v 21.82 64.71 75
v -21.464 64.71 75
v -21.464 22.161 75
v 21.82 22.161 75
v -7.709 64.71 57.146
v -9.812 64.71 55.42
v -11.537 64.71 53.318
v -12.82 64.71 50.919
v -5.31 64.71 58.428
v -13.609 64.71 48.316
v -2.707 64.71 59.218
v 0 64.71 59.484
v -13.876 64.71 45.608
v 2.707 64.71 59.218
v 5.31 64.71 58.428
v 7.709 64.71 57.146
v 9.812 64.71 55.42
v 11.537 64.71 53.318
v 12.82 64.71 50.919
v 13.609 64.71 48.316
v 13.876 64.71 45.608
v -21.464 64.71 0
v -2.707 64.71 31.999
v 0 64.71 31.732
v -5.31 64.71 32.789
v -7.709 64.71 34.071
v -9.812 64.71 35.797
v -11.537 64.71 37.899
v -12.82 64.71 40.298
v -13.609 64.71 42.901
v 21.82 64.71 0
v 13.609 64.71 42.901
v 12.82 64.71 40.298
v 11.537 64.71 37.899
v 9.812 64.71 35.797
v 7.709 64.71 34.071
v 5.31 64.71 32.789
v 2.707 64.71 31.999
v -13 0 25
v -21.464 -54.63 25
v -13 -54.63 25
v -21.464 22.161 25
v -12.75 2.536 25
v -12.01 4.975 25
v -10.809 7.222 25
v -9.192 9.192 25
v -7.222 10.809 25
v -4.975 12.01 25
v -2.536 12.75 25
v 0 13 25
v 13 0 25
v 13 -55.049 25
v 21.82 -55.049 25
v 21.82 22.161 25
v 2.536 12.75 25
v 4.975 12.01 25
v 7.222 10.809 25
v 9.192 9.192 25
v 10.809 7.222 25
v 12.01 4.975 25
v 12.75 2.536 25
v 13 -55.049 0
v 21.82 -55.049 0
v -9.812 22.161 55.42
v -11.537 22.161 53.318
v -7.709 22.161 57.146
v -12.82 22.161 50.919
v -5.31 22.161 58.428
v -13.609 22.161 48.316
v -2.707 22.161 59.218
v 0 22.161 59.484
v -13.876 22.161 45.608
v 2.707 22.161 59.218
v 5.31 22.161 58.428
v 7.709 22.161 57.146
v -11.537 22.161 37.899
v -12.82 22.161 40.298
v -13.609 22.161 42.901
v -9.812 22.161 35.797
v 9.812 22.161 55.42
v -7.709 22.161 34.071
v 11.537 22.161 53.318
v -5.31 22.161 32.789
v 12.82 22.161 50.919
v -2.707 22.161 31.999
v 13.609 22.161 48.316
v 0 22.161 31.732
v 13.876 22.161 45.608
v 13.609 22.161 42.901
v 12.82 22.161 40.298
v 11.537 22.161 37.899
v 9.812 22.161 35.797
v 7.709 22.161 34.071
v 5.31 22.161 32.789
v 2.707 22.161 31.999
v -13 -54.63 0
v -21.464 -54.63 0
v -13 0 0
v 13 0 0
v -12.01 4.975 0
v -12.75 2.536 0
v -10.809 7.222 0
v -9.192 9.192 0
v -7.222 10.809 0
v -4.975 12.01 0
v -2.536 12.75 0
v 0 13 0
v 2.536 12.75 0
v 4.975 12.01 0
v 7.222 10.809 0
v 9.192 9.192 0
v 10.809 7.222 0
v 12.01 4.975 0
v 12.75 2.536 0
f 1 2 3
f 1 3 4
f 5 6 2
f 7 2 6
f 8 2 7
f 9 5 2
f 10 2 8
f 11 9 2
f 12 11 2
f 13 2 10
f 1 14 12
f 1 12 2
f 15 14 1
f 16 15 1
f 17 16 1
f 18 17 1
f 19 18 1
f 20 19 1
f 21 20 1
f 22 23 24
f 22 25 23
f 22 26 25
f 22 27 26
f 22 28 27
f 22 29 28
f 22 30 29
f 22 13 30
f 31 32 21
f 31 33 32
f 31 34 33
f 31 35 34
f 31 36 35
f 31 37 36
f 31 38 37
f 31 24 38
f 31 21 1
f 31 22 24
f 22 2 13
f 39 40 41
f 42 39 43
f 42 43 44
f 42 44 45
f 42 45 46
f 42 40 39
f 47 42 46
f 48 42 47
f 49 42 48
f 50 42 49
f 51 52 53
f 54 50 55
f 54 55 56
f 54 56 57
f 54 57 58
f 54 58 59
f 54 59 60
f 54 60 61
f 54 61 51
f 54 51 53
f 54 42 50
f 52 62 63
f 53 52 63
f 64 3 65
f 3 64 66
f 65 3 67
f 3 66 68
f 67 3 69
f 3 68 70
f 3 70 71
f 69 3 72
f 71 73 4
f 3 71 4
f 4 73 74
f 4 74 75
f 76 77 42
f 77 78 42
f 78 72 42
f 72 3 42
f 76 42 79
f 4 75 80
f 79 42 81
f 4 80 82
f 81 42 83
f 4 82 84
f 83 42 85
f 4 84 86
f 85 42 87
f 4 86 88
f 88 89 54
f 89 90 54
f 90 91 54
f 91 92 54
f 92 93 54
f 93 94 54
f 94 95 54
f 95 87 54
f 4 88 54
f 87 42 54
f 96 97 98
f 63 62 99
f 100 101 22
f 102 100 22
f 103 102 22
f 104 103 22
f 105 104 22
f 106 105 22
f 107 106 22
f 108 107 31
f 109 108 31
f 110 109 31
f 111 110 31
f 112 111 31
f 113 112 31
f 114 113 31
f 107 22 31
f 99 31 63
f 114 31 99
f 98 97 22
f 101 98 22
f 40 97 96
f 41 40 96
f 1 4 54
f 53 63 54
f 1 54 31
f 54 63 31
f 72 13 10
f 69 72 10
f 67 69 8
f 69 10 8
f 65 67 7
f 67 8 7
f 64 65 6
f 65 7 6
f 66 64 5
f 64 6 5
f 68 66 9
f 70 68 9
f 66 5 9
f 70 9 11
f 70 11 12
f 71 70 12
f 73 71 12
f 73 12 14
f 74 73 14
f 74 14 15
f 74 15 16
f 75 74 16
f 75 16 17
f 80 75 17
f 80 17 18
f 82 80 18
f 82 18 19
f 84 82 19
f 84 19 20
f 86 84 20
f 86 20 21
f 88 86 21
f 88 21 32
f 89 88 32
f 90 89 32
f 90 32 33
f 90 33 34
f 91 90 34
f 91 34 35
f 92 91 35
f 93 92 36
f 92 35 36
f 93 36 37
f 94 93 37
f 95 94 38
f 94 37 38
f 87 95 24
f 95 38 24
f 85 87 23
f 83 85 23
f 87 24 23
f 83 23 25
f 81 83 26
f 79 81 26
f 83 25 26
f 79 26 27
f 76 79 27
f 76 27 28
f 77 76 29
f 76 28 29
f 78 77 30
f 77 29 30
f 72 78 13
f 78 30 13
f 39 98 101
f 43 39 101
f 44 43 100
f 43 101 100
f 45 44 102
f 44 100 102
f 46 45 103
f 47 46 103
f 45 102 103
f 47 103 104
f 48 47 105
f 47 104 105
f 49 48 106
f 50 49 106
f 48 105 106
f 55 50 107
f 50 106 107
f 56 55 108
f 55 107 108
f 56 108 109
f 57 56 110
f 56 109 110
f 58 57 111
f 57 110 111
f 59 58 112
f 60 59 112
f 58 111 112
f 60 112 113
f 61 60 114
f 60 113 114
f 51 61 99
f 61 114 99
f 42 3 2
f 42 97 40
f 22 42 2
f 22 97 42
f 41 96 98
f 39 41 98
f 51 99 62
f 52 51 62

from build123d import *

# Parameters (mm, degrees)
F1_DEPTH = 25
F2_W     = 43.2835130529
F2_H     = 42.5491245473
F3_DEPTH = 50
F4_R     = 13.8760258661
F5_DEPTH = 119.7601809589


with BuildPart() as f1:
    # F0 (on Top) → F1 (new body)
    with BuildSketch(Plane.XY):
        with BuildLine():
            ThreePointArc((21.4635129483, 0), (19.2315893312, -9.5303913811), (13, -17.0787115463))
            Line((13, -17.0787115463), (13, -55.0494629913))
            Line((13, -55.0494629913), (21.8200001046, -55.0494629913))
            Line((21.8200001046, -55.0494629913), (21.8200001046, 0))
            Line((21.8200001046, 0), (21.8200001046, 64.7097179676))
            Line((21.8200001046, 64.7097179676), (-21.4635129483, 64.7097179676))
            Line((-21.4635129483, 64.7097179676), (-21.4635129483, 0))
            ThreePointArc((-21.4635129483, 0), (0, 21.4635129483), (21.4635129483, 0))
        make_face()
        with BuildLine():
            Line((-13, -54.6302845692), (-13, -17.0787115463))
            ThreePointArc((-13, -17.0787115463), (-19.2315893312, -9.5303913811), (-21.4635129483, 0))
            Line((-21.4635129483, 0), (-21.4635129483, -54.6302845692))
            Line((-21.4635129483, -54.6302845692), (-13, -54.6302845692))
        make_face()
        with BuildLine():
            ThreePointArc((-13, 0), (0, 13), (13, 0))
            Line((13, 0), (13, -17.0787115463))
            ThreePointArc((13, -17.0787115463), (19.2315893312, -9.5303913811), (21.4635129483, 0))
            ThreePointArc((21.4635129483, 0), (0, 21.4635129483), (-21.4635129483, 0))
            ThreePointArc((-21.4635129483, 0), (-19.2315893312, -9.5303913811), (-13, -17.0787115463))
            Line((-13, -17.0787115463), (-13, 0))
        make_face()
    extrude(amount=F1_DEPTH)

    # F2 (on face) → F3 (join)
    with BuildSketch(Plane.XY.offset(25)):
        with Locations((0.1782435782, 43.4351556939)):
            Rectangle(F2_W, F2_H)
    extrude(amount=F3_DEPTH)

    # F4 (on face) → F5 (cut, through all)
    with BuildSketch(Plane(origin=(0, 64.7097179676, 0), x_dir=(-1, 0, 0), z_dir=(0, 1, 0))):
        with Locations((0, 45.6084646285)):
            Circle(F4_R)
    extrude(amount=-F5_DEPTH, mode=Mode.SUBTRACT)


solid = f1.part
